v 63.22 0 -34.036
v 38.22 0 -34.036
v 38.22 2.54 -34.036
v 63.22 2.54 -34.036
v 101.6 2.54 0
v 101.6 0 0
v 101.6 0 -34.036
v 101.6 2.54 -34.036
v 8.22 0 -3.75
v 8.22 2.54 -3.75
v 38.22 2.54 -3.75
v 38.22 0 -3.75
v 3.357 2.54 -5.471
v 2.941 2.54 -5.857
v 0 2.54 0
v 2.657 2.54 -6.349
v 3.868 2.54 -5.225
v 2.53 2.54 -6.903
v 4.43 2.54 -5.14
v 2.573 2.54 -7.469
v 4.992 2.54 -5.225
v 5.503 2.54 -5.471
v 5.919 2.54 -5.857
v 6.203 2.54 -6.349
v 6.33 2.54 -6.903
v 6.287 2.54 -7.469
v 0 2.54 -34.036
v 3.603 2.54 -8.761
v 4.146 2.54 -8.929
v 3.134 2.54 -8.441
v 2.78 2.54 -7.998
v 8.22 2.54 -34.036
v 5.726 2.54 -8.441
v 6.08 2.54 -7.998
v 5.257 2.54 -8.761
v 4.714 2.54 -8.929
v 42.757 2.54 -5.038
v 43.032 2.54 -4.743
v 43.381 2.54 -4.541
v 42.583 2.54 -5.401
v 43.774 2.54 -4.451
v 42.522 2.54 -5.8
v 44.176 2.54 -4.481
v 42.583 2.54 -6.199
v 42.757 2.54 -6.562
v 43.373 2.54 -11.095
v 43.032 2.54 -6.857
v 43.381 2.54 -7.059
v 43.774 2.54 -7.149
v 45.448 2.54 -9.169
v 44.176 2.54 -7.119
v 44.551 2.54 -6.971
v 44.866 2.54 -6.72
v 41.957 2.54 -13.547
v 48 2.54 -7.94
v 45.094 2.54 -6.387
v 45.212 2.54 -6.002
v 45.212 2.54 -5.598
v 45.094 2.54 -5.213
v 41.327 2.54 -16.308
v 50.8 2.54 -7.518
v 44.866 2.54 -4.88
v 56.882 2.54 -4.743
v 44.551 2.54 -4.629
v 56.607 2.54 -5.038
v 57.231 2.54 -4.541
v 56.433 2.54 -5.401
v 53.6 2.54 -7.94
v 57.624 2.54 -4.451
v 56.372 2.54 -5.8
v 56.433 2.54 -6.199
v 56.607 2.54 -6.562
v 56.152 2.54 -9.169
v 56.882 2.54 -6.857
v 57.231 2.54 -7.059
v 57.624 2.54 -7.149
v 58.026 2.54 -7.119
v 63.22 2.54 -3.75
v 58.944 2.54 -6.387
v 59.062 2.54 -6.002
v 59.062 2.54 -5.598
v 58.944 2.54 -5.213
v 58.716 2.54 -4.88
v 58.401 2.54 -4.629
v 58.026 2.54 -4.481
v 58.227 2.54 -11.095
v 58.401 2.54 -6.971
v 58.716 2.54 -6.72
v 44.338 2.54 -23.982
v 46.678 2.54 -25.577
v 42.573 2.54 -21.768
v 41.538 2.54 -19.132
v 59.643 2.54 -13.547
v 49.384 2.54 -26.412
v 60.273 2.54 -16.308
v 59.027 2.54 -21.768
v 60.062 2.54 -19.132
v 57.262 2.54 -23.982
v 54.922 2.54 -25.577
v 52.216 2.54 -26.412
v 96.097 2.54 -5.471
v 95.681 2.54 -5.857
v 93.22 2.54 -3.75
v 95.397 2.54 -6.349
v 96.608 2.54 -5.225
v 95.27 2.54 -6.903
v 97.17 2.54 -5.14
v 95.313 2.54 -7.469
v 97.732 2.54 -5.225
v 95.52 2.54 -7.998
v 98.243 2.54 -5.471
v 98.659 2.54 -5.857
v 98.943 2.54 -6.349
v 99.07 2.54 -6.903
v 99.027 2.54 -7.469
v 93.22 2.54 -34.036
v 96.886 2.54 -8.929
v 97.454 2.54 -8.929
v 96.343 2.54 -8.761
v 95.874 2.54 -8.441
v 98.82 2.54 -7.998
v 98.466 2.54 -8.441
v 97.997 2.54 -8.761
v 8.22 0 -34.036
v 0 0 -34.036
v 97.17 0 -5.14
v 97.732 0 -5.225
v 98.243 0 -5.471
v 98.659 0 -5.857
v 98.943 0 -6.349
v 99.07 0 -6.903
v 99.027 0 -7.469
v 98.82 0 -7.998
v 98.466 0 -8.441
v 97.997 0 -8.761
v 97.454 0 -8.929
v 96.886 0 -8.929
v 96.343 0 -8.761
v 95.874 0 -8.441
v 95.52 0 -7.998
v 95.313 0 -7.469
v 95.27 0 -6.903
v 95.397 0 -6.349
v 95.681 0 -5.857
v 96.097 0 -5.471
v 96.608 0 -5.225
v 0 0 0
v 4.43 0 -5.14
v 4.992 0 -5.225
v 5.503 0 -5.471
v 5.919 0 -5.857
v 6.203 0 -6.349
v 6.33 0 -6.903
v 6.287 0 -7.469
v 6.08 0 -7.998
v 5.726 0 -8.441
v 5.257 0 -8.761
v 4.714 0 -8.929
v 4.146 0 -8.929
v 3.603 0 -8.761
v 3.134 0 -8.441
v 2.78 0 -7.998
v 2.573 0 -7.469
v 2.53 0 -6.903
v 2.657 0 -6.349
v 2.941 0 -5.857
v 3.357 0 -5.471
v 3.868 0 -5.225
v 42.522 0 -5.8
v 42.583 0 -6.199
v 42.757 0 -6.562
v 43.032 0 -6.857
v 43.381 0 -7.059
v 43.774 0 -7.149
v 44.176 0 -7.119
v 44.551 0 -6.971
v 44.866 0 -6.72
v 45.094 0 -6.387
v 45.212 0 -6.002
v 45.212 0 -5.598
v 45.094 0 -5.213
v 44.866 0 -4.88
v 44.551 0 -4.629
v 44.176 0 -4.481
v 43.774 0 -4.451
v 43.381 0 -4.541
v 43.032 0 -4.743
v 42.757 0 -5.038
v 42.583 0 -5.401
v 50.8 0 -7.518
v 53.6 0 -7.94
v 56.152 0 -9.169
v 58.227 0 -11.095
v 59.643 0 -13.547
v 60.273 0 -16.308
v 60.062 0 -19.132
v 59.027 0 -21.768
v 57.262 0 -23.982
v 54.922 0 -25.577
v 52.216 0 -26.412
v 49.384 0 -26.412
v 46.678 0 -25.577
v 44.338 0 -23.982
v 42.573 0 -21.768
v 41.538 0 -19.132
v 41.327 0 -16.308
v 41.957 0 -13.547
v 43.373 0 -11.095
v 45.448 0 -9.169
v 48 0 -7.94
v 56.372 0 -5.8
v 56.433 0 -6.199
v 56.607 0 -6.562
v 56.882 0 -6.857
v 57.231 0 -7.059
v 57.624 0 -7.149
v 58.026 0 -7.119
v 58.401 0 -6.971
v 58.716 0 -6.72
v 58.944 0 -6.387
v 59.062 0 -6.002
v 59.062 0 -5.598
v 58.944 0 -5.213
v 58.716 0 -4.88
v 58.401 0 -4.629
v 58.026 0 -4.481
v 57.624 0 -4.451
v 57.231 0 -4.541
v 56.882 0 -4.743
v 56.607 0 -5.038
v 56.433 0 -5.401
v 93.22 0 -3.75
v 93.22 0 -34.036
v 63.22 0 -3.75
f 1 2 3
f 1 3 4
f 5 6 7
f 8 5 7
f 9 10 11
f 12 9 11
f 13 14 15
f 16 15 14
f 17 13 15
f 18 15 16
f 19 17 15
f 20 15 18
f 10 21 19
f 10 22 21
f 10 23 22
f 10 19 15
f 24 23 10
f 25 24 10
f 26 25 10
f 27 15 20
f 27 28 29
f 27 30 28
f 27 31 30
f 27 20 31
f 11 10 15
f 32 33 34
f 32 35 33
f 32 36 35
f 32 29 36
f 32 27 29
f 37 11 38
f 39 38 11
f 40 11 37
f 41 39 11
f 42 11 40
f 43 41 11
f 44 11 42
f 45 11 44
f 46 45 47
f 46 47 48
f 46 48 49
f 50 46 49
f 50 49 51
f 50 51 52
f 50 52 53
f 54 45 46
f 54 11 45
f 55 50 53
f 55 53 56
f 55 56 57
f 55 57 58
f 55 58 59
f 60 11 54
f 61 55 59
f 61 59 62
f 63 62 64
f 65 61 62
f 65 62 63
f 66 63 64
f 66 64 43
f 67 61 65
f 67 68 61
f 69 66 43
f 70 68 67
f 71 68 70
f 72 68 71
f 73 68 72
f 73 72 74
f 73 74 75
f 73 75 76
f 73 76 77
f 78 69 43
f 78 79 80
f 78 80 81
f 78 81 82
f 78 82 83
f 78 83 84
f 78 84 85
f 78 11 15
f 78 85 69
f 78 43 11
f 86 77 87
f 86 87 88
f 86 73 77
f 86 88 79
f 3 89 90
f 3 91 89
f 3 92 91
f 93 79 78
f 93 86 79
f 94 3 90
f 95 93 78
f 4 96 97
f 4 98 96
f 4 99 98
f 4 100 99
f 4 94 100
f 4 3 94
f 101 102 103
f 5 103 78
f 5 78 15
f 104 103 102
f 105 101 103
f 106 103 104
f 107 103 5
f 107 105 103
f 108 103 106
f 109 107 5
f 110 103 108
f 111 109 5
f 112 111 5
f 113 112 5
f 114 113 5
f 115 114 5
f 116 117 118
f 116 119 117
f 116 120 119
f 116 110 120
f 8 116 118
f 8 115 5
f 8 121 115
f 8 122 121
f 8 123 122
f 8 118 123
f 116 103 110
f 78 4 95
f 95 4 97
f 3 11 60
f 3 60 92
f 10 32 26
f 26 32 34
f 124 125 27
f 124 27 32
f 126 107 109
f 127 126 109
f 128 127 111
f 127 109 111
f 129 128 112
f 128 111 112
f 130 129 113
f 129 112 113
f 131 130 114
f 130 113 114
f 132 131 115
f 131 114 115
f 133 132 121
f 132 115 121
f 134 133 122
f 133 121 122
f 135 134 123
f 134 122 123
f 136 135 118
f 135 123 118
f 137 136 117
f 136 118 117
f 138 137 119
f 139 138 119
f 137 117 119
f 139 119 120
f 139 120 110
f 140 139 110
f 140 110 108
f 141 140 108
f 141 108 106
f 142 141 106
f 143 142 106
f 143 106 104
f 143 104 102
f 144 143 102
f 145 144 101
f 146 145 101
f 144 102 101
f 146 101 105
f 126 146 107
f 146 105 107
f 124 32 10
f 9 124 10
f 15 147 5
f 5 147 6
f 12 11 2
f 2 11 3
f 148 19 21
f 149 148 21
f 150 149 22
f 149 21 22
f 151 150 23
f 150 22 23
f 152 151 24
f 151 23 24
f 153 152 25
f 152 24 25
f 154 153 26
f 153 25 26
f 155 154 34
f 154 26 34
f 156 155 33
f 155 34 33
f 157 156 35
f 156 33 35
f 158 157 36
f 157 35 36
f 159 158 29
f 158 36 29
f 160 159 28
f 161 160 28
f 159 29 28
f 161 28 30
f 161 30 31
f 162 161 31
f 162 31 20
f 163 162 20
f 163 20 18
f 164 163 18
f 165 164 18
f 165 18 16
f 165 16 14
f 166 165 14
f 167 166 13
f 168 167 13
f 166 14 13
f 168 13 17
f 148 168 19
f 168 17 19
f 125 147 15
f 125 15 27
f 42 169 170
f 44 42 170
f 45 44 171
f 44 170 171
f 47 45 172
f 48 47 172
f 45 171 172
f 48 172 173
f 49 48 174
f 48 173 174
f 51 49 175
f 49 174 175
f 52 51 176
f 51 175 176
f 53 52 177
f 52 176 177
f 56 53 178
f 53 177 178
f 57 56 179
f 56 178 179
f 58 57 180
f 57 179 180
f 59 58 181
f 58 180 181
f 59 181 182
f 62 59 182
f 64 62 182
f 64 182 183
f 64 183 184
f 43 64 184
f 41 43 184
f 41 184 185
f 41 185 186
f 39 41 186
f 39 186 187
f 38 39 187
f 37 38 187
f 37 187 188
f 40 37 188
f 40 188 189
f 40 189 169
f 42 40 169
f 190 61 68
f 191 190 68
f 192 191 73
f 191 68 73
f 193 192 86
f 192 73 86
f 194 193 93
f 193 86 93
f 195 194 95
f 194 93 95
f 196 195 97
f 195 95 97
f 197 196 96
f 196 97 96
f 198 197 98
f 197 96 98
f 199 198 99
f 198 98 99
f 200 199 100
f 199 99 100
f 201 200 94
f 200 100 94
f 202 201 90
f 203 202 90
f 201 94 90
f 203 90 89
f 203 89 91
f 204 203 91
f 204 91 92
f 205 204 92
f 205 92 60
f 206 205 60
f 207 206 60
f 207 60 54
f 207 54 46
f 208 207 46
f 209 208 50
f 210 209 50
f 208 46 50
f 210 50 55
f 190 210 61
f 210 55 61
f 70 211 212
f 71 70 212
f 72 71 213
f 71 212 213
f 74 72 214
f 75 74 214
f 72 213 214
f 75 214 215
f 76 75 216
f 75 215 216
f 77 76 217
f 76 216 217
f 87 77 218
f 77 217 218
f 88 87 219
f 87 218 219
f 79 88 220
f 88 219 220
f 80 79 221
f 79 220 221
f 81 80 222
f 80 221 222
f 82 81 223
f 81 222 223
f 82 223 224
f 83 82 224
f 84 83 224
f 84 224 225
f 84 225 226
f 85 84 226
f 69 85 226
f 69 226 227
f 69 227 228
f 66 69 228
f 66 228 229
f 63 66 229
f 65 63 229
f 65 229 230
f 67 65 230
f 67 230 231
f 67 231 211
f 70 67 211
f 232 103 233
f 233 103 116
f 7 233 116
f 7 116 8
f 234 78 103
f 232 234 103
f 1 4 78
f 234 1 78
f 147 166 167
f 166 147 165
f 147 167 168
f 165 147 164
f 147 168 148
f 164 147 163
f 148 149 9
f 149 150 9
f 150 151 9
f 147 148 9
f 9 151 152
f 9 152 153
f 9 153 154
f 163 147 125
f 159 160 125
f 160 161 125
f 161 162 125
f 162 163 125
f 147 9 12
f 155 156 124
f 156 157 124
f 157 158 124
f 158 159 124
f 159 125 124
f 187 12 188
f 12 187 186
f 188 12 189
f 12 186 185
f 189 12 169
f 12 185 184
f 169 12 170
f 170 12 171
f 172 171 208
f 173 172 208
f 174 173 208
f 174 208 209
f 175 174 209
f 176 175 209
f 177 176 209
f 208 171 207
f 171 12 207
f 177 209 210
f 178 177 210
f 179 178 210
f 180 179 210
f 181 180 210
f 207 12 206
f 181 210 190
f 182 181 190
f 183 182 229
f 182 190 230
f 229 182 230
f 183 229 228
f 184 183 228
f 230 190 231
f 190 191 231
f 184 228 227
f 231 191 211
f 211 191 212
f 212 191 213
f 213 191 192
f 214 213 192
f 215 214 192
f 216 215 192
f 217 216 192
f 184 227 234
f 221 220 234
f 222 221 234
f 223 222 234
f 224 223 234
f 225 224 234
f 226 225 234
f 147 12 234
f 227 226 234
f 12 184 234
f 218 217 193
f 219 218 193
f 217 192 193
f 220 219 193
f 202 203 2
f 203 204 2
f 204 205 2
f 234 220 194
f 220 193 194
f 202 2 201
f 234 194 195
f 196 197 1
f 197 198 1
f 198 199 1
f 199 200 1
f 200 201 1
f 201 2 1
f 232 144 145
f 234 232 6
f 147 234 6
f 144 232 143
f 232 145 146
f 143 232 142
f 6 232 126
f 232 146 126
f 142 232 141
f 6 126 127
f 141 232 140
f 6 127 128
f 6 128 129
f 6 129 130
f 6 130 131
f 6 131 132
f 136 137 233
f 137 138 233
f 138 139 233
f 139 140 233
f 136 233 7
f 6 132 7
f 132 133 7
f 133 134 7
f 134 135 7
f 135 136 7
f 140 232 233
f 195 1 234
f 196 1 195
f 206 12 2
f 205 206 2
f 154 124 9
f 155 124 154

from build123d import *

# Parameters (mm, degrees)
SKETCH1_W                 = 101.6
SKETCH1_H                 = 34.036
BOSS_EXTRUDE1_DEPTH       = 2.54
CUT_EXTRUDE2_DEPTH        = 2.54
LPATTERN1_COUNT           = 2
LPATTERN1_PITCH           = 55
TAP_DRILL_FOR_6_32_TAP1_D = 2.7051
SKETCH2_R                 = 9.5
CUT_EXTRUDE3_DEPTH        = 2.54
SKETCH11_R                = 1.905
CUT_EXTRUDE5_DEPTH        = 2.54


with BuildPart() as part:
    # Sketch1 → Boss-Extrude1 (new body)
    with BuildSketch(Plane(origin=(0, 0, 0), x_dir=(1, 0, 0), z_dir=(0, 1, 0))):
        with Locations((50.8, 17.018)):
            Rectangle(SKETCH1_W, SKETCH1_H)
    extrude(amount=BOSS_EXTRUDE1_DEPTH)

    # Sketch7 → Cut-Extrude2 (cut)
    with BuildSketch(Plane(origin=(0, 2.54, 0), x_dir=(1, 0, 0), z_dir=(0, 1, 0))):
        Polygon((38.220191954, 3.75), (38.220191954, 18.75), (38.220191954, 34.036), (8.22019201, 34.036), (8.22019201, 3.75), align=None)
    cut_extrude2 = extrude(amount=-CUT_EXTRUDE2_DEPTH, mode=Mode.SUBTRACT)

    # LPattern1: Cut-Extrude2 ×2
    with Locations(*[(i * LPATTERN1_PITCH, 0, 0) for i in range(1, LPATTERN1_COUNT)]):
        add(cut_extrude2, mode=Mode.SUBTRACT)

    # Tap Drill for #6-32 Tap1 (through all)
    with Locations(Plane(origin=(0, 2.54, 0), x_dir=(1, 0, 0), z_dir=(0, 1, 0))):
        with Locations((43.875, 5.800000084), (57.725, 5.8)):
            Hole(TAP_DRILL_FOR_6_32_TAP1_D / 2)

    # Sketch2 → Cut-Extrude3 (cut)
    with BuildSketch(Plane(origin=(0, 2.54, 0), x_dir=(1, 0, 0), z_dir=(0, 1, 0))):
        with Locations(Location((50.8, 17.018, 0), (0, 0, 270))):
            Circle(SKETCH2_R)
    extrude(amount=-CUT_EXTRUDE3_DEPTH, mode=Mode.SUBTRACT)

    # Sketch11 → Cut-Extrude5 (cut)
    with BuildSketch(Plane(origin=(0, 2.54, 0), x_dir=(1, 0, 0), z_dir=(0, 1, 0))):
        with Locations(Location((4.43, 7.045, 0), (0, 0, 270))):
            Circle(SKETCH11_R)
        with Locations(Location((97.17, 7.045, 0), (0, 0, 270))):
            Circle(SKETCH11_R)
    extrude(amount=-CUT_EXTRUDE5_DEPTH, mode=Mode.SUBTRACT)


solid = part.part
